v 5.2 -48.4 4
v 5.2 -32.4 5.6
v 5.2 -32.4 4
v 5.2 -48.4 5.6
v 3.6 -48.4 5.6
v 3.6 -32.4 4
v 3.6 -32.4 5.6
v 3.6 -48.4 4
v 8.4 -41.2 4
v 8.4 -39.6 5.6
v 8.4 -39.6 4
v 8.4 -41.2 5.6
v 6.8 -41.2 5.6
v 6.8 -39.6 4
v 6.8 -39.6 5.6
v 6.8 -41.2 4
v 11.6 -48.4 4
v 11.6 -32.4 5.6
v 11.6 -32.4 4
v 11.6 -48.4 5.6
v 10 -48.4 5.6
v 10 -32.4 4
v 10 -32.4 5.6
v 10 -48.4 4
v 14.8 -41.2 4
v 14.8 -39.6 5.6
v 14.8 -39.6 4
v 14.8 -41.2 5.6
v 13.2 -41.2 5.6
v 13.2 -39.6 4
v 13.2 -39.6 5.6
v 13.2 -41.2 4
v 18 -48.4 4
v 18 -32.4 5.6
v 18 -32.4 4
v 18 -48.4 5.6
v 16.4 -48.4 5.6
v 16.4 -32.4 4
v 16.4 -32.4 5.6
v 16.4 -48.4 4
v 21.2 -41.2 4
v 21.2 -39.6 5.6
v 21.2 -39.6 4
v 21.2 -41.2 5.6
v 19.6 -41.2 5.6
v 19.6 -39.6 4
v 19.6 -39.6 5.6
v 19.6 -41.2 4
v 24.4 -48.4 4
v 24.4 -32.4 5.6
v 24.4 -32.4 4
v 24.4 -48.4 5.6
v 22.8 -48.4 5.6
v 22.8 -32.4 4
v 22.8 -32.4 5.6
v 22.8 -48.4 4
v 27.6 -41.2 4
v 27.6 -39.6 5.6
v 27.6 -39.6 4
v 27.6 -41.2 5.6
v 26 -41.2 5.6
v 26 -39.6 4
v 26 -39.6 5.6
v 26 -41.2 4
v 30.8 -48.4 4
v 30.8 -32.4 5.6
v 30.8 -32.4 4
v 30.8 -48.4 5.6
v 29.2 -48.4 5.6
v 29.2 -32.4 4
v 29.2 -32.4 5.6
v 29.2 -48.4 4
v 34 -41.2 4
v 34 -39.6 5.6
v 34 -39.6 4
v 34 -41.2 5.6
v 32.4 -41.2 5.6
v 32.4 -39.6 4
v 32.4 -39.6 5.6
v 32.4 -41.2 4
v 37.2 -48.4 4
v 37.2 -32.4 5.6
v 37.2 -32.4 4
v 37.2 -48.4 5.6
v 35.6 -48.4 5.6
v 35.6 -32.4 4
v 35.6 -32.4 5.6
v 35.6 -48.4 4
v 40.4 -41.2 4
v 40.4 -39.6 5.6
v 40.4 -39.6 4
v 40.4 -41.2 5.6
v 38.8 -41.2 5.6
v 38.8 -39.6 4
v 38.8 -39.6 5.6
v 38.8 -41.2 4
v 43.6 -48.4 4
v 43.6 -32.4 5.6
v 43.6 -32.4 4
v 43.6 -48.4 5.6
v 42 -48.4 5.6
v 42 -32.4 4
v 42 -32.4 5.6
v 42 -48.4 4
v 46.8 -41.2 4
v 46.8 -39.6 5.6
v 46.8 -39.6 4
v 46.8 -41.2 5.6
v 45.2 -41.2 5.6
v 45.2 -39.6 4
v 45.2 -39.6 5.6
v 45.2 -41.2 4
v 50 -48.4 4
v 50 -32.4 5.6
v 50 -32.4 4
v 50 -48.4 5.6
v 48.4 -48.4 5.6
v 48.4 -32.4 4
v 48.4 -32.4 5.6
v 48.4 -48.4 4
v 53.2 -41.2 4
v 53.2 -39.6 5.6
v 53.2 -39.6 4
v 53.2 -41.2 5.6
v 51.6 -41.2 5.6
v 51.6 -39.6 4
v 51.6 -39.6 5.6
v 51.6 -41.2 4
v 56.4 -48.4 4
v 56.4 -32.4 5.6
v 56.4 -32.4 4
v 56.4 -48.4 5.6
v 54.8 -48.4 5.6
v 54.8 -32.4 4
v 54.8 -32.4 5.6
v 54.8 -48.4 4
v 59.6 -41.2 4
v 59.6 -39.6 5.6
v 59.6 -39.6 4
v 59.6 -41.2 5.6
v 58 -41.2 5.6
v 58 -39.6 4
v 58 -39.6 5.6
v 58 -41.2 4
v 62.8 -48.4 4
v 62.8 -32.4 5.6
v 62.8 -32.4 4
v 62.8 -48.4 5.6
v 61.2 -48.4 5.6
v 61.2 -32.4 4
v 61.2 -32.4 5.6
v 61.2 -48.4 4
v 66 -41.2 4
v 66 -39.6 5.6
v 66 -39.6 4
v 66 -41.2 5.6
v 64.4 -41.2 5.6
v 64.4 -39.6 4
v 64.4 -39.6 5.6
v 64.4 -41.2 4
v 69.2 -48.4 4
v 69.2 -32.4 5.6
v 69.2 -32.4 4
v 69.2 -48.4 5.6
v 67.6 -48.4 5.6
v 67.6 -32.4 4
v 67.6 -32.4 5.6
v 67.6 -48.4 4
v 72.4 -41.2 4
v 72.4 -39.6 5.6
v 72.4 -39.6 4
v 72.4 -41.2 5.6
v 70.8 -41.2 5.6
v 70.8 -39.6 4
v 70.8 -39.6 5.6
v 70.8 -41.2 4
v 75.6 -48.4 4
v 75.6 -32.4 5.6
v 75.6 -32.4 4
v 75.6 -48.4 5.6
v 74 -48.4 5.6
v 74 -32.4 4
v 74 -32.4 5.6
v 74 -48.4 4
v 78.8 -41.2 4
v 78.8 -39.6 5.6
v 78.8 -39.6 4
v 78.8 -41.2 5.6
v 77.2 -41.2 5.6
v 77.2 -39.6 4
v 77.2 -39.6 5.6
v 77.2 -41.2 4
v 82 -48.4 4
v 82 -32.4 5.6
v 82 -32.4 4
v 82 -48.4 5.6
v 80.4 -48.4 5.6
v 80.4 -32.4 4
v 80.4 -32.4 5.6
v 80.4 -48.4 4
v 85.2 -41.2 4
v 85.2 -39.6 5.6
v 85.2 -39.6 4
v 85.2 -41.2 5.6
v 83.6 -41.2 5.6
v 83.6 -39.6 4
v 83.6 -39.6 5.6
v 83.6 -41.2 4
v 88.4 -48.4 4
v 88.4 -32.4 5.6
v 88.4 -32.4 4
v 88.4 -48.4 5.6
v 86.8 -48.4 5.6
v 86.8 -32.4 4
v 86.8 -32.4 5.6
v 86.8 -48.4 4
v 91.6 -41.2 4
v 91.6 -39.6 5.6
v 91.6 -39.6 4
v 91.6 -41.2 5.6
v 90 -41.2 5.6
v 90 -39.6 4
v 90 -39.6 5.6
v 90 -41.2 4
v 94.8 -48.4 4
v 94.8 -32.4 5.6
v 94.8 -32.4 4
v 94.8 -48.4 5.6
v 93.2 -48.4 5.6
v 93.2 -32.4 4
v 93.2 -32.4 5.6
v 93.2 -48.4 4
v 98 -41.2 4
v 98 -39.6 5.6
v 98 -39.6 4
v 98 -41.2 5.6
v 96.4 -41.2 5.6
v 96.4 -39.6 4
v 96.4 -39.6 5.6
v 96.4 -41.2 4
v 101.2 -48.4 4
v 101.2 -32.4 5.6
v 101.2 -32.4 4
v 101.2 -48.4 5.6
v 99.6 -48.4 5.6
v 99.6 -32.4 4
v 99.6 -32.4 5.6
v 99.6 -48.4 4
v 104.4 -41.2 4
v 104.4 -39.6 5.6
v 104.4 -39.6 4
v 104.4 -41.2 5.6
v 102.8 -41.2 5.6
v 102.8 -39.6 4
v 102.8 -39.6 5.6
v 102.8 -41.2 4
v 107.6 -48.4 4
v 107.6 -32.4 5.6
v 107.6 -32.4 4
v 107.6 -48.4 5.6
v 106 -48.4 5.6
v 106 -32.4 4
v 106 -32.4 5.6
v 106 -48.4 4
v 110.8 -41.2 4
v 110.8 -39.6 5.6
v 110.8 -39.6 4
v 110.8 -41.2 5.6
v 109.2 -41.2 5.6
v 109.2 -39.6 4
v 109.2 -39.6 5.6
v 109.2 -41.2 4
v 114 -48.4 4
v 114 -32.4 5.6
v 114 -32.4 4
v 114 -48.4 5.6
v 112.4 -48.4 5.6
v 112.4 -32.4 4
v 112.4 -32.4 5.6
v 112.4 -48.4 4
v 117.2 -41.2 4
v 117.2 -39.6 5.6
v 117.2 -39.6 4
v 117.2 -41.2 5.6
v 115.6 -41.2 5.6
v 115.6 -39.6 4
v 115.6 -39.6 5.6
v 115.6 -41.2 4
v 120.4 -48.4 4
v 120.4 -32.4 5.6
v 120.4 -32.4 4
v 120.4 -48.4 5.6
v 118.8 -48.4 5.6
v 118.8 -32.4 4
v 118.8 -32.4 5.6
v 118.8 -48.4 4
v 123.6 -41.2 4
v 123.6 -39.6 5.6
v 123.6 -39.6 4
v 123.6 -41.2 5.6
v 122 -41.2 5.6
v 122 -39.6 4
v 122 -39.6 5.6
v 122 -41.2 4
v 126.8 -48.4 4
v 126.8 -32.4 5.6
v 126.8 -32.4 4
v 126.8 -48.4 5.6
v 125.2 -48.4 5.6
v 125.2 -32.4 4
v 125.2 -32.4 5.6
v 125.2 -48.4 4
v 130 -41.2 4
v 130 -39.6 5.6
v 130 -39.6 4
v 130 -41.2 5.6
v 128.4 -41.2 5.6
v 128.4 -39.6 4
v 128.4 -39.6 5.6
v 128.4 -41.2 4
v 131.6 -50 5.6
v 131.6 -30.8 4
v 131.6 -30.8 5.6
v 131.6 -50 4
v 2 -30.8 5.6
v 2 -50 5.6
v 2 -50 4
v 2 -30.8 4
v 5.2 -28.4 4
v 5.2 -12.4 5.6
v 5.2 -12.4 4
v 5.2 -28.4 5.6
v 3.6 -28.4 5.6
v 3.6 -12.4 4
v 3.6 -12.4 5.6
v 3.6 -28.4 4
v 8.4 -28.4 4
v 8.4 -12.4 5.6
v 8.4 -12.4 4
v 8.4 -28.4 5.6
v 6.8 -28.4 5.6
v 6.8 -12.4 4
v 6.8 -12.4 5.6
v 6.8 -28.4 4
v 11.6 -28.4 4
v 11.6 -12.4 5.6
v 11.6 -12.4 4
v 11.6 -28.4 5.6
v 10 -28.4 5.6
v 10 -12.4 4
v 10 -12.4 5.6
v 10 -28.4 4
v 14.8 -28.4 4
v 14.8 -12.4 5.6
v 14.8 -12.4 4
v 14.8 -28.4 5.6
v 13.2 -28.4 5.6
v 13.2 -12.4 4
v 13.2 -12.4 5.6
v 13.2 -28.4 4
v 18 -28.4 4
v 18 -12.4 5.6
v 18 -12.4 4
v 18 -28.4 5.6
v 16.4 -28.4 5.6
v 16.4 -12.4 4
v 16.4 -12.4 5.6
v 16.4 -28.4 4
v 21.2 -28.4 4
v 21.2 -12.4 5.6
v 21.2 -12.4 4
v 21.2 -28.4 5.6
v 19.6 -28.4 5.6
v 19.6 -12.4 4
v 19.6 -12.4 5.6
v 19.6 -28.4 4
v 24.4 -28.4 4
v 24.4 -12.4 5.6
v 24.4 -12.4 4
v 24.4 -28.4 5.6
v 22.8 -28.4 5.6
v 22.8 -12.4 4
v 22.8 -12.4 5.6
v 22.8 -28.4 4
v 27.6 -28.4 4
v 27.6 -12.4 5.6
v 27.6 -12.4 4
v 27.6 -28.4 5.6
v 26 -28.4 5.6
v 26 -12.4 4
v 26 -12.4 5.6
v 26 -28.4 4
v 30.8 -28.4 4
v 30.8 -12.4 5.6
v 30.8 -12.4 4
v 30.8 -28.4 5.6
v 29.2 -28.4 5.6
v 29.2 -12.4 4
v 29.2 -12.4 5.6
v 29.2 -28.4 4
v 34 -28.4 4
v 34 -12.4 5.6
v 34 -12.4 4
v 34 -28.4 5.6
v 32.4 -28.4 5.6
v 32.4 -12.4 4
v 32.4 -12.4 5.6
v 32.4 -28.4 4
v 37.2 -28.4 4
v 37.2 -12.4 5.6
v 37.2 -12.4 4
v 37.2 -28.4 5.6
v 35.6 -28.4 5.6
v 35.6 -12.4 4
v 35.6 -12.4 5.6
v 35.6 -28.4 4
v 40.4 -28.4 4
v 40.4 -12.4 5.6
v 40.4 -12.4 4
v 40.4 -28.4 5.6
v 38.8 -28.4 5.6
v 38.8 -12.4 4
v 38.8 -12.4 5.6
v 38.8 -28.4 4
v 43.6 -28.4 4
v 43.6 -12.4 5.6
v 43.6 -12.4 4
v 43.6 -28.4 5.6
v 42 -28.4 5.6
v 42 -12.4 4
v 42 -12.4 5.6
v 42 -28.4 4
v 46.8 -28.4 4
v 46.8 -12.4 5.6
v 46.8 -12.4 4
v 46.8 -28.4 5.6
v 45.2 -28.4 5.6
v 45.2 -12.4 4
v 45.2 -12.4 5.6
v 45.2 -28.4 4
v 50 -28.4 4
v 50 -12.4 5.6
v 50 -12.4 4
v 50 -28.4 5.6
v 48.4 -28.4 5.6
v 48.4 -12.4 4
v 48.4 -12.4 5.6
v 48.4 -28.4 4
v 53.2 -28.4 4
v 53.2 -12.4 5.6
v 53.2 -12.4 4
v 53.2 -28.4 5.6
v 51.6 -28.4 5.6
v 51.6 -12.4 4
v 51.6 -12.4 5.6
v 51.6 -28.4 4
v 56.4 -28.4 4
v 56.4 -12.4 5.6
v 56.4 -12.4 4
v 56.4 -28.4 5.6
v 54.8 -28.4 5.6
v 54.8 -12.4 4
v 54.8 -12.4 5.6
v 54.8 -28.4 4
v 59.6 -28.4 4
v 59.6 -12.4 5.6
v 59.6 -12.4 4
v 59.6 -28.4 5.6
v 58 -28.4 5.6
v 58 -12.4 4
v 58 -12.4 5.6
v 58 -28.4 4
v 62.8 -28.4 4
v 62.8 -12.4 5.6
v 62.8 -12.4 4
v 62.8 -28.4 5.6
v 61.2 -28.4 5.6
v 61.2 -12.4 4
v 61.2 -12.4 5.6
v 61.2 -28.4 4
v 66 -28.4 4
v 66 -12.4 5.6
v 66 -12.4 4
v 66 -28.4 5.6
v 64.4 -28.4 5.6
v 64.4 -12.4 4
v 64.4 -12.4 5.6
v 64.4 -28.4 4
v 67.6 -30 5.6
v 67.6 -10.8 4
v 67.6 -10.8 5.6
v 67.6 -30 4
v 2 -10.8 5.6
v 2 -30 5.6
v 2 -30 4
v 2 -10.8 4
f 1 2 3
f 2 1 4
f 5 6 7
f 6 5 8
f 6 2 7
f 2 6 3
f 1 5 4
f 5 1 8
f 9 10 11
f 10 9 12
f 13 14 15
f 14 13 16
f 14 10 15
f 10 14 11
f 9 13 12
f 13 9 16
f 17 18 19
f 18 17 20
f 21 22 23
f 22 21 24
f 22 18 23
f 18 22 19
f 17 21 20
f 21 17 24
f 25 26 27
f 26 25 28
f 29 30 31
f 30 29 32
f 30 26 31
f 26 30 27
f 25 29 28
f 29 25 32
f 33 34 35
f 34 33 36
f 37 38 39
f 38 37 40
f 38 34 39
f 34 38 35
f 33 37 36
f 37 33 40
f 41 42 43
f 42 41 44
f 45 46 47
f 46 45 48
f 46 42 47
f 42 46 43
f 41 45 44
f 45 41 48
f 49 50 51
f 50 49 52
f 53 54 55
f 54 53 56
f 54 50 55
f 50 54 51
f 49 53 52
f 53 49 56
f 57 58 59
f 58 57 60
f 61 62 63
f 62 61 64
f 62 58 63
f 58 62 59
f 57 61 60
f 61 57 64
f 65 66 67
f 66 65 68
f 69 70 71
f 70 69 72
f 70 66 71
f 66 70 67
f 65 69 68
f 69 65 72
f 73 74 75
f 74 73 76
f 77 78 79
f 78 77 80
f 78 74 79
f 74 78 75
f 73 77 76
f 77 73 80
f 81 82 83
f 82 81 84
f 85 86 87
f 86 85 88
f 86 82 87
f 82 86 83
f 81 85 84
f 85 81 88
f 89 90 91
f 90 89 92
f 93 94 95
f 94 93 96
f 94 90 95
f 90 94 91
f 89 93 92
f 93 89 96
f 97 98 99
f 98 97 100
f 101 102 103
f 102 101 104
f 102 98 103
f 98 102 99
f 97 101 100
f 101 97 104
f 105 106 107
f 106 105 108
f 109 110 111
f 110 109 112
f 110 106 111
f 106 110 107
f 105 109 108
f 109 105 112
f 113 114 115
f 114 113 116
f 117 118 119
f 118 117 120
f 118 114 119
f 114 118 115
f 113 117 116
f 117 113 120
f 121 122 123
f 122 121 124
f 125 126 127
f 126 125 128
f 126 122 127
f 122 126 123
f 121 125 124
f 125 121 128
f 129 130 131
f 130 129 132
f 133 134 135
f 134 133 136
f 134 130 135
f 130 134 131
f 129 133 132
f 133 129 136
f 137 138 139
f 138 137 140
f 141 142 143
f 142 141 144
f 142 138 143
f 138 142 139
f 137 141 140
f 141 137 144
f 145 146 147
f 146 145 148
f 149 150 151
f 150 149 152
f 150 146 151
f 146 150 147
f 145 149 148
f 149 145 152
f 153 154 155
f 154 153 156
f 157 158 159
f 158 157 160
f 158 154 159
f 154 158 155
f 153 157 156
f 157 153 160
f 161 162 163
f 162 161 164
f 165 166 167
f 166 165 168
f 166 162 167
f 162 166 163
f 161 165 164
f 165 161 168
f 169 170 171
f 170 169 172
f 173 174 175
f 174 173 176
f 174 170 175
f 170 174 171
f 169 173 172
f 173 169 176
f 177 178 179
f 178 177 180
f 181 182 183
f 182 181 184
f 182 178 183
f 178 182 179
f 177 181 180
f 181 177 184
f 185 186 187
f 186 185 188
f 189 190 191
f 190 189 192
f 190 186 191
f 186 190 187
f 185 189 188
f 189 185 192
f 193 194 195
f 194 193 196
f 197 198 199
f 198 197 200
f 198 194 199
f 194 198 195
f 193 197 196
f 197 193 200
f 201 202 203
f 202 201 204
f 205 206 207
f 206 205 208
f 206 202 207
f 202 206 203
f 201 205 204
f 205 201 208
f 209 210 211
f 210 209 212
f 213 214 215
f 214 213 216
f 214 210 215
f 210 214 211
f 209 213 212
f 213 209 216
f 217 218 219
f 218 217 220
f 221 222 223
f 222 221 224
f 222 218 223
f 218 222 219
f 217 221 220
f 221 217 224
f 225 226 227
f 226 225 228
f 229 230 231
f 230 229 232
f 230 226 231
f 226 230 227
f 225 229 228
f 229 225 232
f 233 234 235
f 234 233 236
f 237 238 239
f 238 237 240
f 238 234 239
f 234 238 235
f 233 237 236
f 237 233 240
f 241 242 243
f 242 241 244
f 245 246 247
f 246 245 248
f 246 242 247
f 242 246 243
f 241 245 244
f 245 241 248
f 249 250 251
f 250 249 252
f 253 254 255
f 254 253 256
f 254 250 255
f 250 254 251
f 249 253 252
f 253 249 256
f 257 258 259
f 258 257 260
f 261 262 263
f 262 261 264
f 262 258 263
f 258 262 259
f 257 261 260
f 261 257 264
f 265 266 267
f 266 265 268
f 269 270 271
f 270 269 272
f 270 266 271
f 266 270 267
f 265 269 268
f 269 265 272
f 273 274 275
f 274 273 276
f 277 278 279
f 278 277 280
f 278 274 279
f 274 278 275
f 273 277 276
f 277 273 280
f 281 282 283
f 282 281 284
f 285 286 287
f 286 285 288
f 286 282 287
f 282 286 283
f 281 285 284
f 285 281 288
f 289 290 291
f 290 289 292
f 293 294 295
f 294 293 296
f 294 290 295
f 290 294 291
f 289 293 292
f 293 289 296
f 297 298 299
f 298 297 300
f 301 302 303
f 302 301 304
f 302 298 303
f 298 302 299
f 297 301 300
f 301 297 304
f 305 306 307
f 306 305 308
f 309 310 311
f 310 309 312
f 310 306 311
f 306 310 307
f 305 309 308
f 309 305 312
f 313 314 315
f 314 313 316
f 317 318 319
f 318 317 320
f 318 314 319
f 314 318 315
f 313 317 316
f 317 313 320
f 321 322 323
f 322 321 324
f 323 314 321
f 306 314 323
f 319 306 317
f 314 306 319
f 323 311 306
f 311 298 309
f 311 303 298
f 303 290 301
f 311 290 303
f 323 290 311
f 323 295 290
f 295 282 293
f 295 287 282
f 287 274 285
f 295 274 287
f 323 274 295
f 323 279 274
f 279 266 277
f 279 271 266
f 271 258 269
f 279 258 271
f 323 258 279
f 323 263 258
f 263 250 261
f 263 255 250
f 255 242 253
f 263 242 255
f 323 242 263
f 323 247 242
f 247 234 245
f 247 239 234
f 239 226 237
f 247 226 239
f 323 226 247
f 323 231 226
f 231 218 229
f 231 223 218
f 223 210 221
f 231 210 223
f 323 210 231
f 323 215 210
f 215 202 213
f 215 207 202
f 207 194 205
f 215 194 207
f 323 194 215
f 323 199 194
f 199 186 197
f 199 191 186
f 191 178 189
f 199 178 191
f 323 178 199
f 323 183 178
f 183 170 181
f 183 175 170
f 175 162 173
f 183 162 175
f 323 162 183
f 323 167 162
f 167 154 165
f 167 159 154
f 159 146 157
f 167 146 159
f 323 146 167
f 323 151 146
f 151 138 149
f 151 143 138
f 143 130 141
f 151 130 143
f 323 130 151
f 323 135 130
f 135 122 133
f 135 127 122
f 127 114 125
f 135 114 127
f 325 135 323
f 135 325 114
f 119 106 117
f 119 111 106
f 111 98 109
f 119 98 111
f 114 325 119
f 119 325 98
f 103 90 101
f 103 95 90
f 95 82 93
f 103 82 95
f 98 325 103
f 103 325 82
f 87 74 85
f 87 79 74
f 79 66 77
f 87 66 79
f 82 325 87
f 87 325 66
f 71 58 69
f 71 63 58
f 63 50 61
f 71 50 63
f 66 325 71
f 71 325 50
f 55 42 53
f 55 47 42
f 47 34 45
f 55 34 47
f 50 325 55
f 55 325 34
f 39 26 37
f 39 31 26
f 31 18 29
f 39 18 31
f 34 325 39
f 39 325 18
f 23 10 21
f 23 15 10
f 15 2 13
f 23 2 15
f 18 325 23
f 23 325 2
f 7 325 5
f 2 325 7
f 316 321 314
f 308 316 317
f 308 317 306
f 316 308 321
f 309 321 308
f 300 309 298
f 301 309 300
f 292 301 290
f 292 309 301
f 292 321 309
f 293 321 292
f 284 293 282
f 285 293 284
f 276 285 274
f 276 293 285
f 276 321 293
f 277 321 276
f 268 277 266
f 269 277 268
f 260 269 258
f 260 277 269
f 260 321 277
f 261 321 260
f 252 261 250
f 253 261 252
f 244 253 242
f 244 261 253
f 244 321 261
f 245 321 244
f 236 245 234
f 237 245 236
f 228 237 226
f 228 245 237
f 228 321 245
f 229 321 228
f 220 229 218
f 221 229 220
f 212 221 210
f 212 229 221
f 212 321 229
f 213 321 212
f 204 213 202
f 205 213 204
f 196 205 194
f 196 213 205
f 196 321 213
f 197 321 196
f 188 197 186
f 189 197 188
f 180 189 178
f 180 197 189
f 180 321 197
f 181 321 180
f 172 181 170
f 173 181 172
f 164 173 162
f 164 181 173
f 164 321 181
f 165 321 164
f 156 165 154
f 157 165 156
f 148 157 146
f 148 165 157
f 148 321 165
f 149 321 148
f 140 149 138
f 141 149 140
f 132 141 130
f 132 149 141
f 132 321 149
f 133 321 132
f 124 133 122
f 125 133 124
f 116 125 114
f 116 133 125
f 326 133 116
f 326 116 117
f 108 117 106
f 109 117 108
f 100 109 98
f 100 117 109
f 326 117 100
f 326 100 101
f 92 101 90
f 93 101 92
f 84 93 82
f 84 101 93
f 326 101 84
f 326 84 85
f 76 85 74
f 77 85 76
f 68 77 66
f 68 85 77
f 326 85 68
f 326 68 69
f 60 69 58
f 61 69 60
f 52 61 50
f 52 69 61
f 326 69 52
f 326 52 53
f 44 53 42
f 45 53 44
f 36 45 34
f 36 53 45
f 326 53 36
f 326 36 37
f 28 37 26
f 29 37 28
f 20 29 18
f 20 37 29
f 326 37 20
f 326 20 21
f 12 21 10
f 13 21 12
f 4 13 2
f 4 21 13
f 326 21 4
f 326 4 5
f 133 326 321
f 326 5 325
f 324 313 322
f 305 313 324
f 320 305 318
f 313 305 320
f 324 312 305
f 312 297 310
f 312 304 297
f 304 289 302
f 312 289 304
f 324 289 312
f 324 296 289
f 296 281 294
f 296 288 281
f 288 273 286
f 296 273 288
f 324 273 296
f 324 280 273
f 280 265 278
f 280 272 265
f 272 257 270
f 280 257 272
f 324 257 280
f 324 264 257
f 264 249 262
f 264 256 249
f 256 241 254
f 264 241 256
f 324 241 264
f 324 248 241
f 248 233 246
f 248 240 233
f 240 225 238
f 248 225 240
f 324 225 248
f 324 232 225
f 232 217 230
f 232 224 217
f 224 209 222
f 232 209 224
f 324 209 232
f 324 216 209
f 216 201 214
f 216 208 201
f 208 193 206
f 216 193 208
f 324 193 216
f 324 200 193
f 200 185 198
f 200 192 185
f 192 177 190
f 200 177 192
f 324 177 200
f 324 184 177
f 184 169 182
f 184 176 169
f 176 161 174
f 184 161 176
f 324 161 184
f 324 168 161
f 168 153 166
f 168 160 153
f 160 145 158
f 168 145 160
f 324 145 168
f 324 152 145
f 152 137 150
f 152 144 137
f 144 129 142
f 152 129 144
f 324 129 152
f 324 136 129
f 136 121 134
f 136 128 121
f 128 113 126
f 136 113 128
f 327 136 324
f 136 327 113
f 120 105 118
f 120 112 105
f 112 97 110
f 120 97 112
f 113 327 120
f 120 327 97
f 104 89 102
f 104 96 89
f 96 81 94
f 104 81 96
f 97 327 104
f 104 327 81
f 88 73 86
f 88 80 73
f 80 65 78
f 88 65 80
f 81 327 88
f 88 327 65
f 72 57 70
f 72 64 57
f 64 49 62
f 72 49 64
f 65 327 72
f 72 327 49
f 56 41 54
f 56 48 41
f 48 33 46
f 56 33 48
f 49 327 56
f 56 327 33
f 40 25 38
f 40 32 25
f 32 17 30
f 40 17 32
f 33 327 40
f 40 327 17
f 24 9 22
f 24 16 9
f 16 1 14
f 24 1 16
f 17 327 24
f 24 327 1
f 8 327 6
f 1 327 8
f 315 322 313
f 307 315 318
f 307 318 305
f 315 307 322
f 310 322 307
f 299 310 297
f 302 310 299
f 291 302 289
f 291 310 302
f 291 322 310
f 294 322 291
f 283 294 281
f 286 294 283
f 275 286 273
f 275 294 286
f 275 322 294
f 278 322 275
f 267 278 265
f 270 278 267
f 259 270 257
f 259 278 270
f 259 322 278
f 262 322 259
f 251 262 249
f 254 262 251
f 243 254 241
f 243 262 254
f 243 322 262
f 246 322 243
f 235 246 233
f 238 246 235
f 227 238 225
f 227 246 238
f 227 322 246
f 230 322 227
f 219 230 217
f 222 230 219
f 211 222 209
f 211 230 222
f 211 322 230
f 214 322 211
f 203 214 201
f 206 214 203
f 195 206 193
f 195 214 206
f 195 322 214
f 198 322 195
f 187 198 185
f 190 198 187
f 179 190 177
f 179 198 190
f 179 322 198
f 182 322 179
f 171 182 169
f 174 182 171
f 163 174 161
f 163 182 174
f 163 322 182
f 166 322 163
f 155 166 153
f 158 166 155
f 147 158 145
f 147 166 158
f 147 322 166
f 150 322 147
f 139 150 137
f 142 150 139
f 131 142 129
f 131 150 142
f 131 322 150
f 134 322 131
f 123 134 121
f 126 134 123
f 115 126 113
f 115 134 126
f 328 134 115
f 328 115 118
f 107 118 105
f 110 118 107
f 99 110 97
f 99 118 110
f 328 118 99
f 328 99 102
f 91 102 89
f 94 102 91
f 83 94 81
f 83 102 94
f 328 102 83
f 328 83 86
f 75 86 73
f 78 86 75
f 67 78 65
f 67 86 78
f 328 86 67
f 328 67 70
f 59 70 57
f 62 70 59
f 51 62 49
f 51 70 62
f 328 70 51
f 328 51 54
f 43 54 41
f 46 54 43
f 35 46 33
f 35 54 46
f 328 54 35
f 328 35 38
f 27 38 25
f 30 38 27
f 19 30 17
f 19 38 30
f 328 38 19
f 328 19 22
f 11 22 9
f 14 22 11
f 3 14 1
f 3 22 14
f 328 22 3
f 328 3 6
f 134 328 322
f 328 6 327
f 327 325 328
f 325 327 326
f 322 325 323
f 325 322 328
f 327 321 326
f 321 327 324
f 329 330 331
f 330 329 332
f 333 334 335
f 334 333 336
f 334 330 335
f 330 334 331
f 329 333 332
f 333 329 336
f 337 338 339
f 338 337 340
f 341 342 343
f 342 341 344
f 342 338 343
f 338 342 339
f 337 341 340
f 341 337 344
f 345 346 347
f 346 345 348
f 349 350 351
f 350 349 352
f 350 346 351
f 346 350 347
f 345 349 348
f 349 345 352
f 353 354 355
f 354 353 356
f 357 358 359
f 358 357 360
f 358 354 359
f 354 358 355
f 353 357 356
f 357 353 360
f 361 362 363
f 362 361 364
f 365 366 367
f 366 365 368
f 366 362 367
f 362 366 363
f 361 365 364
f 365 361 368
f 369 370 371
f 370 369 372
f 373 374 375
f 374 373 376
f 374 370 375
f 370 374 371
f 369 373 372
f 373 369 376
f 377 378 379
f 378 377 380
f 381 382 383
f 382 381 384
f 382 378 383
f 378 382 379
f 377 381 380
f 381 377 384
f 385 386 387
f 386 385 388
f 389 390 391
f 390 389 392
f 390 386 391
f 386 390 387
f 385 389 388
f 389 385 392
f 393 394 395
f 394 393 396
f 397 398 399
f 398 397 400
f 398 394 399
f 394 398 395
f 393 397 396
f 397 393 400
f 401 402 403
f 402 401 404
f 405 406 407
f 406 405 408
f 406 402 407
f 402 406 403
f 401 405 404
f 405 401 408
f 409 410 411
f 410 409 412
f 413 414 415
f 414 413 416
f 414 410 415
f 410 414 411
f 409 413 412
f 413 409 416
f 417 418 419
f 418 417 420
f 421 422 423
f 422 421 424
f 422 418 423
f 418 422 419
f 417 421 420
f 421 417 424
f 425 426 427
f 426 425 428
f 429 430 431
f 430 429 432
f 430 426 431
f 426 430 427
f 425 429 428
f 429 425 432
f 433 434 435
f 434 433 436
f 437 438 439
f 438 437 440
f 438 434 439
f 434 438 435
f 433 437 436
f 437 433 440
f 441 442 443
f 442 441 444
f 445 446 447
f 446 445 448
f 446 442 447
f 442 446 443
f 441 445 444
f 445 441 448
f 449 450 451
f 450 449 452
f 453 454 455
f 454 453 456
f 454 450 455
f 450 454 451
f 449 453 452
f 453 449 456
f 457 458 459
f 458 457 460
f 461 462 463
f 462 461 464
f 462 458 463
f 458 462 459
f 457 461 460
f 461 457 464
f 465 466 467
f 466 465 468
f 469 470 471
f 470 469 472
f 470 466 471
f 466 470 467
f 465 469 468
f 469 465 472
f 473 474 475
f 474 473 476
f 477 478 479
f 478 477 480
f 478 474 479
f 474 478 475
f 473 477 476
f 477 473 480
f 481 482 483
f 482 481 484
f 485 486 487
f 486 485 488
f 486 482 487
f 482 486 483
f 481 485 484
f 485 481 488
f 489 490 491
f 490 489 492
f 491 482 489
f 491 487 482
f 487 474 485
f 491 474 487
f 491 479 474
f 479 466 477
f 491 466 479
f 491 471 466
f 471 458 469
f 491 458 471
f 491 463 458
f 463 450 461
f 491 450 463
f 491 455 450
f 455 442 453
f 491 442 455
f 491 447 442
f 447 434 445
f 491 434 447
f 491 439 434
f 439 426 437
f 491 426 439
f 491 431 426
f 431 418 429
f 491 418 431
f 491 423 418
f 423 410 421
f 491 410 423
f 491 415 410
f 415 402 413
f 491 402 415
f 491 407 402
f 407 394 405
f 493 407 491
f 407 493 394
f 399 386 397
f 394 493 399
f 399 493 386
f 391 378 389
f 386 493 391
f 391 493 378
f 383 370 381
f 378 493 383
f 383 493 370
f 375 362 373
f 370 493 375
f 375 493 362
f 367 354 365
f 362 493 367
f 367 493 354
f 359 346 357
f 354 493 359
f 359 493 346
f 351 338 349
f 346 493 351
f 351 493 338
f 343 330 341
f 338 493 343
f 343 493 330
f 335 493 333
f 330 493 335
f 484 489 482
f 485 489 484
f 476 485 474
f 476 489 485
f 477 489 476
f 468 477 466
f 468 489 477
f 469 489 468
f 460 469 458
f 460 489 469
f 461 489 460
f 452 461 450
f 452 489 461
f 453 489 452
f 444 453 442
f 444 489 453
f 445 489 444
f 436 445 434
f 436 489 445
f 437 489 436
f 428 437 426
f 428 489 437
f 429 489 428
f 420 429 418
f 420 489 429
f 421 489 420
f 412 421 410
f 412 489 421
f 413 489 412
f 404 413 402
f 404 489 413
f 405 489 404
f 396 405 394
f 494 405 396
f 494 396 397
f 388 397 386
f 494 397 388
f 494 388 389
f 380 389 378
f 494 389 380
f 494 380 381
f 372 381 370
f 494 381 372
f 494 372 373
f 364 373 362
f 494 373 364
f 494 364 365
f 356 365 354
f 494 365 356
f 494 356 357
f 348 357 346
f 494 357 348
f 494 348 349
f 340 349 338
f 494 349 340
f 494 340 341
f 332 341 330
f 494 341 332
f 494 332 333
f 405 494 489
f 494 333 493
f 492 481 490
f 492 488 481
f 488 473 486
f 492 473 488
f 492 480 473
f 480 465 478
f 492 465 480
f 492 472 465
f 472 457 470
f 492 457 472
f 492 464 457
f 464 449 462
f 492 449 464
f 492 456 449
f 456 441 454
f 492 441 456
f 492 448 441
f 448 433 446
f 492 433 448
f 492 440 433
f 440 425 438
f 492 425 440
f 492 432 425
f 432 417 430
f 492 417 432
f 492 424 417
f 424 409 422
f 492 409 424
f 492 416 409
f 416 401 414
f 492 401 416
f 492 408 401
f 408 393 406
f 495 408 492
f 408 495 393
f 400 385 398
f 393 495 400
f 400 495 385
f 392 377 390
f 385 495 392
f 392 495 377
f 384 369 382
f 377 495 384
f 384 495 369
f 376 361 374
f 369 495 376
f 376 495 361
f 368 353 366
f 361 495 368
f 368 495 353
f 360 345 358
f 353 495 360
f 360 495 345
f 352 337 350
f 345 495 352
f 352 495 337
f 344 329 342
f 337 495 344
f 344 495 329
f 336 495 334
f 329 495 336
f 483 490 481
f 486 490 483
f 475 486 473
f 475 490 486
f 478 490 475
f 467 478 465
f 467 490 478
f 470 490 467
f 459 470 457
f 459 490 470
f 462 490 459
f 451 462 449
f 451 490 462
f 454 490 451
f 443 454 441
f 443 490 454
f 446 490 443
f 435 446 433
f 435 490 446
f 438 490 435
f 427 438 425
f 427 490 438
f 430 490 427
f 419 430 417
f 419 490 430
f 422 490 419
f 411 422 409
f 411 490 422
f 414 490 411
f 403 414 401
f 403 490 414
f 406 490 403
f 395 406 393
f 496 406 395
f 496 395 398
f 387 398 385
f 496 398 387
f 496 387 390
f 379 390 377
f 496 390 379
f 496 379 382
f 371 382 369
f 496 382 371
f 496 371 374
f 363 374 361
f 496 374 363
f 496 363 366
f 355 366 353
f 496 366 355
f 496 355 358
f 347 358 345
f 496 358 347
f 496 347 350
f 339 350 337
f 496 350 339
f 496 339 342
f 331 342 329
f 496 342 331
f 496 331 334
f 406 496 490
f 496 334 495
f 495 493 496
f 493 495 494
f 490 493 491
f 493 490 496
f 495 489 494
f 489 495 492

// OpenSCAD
// file: myCylinder.scad
// Copyright Stephen Morrisson 2017
// All rights reserved

// rh Cent Cylinder
// rh Cylinder
use <myCube.scad>

module rhCentCylinder(c, rRadius, z)
{
    color(c) cylinder(h=z, r=rRadius, center=false);
}
translate([-15, -15, 0]) rhCentCylinder("red", 3, 2);

module rhCylinder(c, rRadius, z)
{
    translate([rRadius, rRadius, 0]) rhCentCylinder(c, rRadius, z);
}
translate([-15, 15, 0]) rhCylinder("blue", 2, 3);

module transCylinder(c, xO, yO, zO, rRadius, z)
{
    translate([xO, yO, zO]) rhCylinder(c, rRadius, z);
}
//transCylinder("red", 0,0,0, 4, 1);
transCylinder("green", 15, 15, 0, 2, 2);

module centRightCylinder(c, rRadius, z)
{
    rD = rRadius * 3.0;
    difference()
    {
        rhCentCylinder(c, rRadius, z);
        transCube(c, -rD, -rRadius, -rRadius,  rD, rD, rD);
    }
}
centRightCylinder("green", 2, 2);

module rightHalfCylinder(c, xO, yO, zO, rRadius, z)
{
    translate([xO, yO + rRadius, zO]) centRightCylinder(c, rRadius, z);
}
rightHalfCylinder("yellow", 10, 0, 0, 2, 1);

module leftHalfCylinder(c, xO, yO, zO, rRadius, z)
{
    translate([xO + rRadius, yO + rRadius, zO])
        rotate([0,0,180]) centRightCylinder(c, rRadius, z);
}
leftHalfCylinder("yellow", -10, 0, 0, 2, 1);

module topHalfCylinder(c, xO, yO, zO, rRadius, z)
{
    translate([xO + rRadius, yO, zO])
        rotate([0,0,90]) centRightCylinder(c, rRadius, z);
}
topHalfCylinder("yellow", 0, 10, 0, 2, 1);

module bottomHalfCylinder(c, xO, yO, zO, rRadius, z)
{
    translate([xO + rRadius, yO + rRadius, zO])
        rotate([0,0,270]) centRightCylinder(c, rRadius, z);
}
bottomHalfCylinder("yellow", 0, -10, 0, 2, 1);
// file: myCube.scad
// Copyright Stephen Morrisson 2017
// All rights reserved

// {xyz, rot, trans, tr} Cube

module xyzCube(c, x, y, z)
{
    color(c) cube([x, y, z], false);
}

module rotCube(c, rotX, rotY, rotZ, x, y, z)
{
    rotate([rotX, rotY, rotZ]) xyzCube(c, x, y, z);
}
translate([-15, 15, 0,])rotCube("green", 45, 45, 45, 2,2,2);

module transCube(c, xOffset, yOffset, zOffset, x, y, z)
{
    translate([xOffset, yOffset, zOffset]) xyzCube(c, x, y, z);
}
transCube("brown", -15, -15, 0, 3, 2, 1);


module trCube(c, rotX, rotY, rotZ, xO, yO, zO, x, y, z)
{
    translate([xO, yO, zO])
    rotate([rotX, rotY, rotZ])
    xyzCube(c, x, y, z);
}
//trCube("yellow", 0,0,0, 0,0,0, 2, 3, 4);
//trCube("green", 45, 45, 45, 4, 3, 1, 5, 6, 7);
//trCube("blue", 0, 0, 45, 20, 0, 0, 5, 6, 7);
trCube("orange", 0,0,0, -10, 0, 0, 1,1,1);
//trCube("orange", 45,0,0, -15, 0, 0, 1,1,1);
//trCube("orange", 0,45,0, -20, 0, 0, 1,1,1);
//trCube("orange", 0,0,45, -25, 0, 0, 1,1,1);
// main file
// Copyright Stephen Morrisson 2017
// All rights reserved

use <myCube.scad>
use <myCylinder.scad>

// rigid heddle Shed

// A and B are slots (or wholes for ridit heddle
// count is the number of A
// One b for each A
module ShedAB(c, xBoarder, yBoarder, z, xA, yA, xB, yB, xSpacer, count)
{
    yMaxOpening = max(yA, yB);
    zBig = z * 3;
    
    xAB = xA + xB + xSpacer + xSpacer;
    xSize = xBoarder * 2.0 + count * xAB - xSpacer;
    ySize = yBoarder * 2.0 + yMaxOpening;
    
    yAOffset = yBoarder + ((yMaxOpening - yA) / 2.0);
    yBOffset = yBoarder + ((yMaxOpening - yB) / 2.0);
    
    difference()
    {
        xyzCube(c, xSize, ySize, z);
        {
            iCount = count - 1;
            for (i = [0: iCount])
            {
                xAO = xBoarder + (i * xAB);
                transCube(c, xAO, yAOffset, -z, xA, yA, zBig);
                xBO = xAO + xA + xSpacer;
                transCube(c, xBO, yBOffset, -z, xB, yB, zBig);  
            }
        }
    }
}
//ShedAB("green", 3, 3, 1, 1.6, 10, 1.6, 16, 1.6, 2);
//translate([-3,0,0]) ShedAB("green", 3, 3, 1, 2, 10, 3, 4, 1, 3);

module SimpleRigidShed(c, aBoarder, z, aOpenings, yA, count)
{
    //xyzCube("red", 1,1,1);
    a = aOpenings;
    ShedAB(c, aBoarder, aBoarder, z, a, yA, a, a, a, count); 
}
//SimpleRigidShed("blue", 1.6, 1.6, 1.6, 16.0, 20);

module transSimpleRigidShed(c, xO, yO, zO, aBoarder, z, aOpenings, yA, count)
{
    translate([xO, yO, zO])
        SimpleRigidShed(c, aBoarder, z, aOpenings, yA, count);
}
transSimpleRigidShed("red", 2,-50,4, 1.6, 1.6, 1.6, 16.0, 20);

// count must be even.
module transSimpleShed(c, xO, yO, zO, aBoarder, z, xHole, yHole, count)
{
    translate([xO, yO, zO])
    {
        ShedAB(c, aBoarder, aBoarder, z,
            xHole, yHole, xHole, yHole, xHole, count / 2);
    }
}
transSimpleShed("green", 2,-30,4, 1.6, 1.6, 1.6, 16.0, 20);
